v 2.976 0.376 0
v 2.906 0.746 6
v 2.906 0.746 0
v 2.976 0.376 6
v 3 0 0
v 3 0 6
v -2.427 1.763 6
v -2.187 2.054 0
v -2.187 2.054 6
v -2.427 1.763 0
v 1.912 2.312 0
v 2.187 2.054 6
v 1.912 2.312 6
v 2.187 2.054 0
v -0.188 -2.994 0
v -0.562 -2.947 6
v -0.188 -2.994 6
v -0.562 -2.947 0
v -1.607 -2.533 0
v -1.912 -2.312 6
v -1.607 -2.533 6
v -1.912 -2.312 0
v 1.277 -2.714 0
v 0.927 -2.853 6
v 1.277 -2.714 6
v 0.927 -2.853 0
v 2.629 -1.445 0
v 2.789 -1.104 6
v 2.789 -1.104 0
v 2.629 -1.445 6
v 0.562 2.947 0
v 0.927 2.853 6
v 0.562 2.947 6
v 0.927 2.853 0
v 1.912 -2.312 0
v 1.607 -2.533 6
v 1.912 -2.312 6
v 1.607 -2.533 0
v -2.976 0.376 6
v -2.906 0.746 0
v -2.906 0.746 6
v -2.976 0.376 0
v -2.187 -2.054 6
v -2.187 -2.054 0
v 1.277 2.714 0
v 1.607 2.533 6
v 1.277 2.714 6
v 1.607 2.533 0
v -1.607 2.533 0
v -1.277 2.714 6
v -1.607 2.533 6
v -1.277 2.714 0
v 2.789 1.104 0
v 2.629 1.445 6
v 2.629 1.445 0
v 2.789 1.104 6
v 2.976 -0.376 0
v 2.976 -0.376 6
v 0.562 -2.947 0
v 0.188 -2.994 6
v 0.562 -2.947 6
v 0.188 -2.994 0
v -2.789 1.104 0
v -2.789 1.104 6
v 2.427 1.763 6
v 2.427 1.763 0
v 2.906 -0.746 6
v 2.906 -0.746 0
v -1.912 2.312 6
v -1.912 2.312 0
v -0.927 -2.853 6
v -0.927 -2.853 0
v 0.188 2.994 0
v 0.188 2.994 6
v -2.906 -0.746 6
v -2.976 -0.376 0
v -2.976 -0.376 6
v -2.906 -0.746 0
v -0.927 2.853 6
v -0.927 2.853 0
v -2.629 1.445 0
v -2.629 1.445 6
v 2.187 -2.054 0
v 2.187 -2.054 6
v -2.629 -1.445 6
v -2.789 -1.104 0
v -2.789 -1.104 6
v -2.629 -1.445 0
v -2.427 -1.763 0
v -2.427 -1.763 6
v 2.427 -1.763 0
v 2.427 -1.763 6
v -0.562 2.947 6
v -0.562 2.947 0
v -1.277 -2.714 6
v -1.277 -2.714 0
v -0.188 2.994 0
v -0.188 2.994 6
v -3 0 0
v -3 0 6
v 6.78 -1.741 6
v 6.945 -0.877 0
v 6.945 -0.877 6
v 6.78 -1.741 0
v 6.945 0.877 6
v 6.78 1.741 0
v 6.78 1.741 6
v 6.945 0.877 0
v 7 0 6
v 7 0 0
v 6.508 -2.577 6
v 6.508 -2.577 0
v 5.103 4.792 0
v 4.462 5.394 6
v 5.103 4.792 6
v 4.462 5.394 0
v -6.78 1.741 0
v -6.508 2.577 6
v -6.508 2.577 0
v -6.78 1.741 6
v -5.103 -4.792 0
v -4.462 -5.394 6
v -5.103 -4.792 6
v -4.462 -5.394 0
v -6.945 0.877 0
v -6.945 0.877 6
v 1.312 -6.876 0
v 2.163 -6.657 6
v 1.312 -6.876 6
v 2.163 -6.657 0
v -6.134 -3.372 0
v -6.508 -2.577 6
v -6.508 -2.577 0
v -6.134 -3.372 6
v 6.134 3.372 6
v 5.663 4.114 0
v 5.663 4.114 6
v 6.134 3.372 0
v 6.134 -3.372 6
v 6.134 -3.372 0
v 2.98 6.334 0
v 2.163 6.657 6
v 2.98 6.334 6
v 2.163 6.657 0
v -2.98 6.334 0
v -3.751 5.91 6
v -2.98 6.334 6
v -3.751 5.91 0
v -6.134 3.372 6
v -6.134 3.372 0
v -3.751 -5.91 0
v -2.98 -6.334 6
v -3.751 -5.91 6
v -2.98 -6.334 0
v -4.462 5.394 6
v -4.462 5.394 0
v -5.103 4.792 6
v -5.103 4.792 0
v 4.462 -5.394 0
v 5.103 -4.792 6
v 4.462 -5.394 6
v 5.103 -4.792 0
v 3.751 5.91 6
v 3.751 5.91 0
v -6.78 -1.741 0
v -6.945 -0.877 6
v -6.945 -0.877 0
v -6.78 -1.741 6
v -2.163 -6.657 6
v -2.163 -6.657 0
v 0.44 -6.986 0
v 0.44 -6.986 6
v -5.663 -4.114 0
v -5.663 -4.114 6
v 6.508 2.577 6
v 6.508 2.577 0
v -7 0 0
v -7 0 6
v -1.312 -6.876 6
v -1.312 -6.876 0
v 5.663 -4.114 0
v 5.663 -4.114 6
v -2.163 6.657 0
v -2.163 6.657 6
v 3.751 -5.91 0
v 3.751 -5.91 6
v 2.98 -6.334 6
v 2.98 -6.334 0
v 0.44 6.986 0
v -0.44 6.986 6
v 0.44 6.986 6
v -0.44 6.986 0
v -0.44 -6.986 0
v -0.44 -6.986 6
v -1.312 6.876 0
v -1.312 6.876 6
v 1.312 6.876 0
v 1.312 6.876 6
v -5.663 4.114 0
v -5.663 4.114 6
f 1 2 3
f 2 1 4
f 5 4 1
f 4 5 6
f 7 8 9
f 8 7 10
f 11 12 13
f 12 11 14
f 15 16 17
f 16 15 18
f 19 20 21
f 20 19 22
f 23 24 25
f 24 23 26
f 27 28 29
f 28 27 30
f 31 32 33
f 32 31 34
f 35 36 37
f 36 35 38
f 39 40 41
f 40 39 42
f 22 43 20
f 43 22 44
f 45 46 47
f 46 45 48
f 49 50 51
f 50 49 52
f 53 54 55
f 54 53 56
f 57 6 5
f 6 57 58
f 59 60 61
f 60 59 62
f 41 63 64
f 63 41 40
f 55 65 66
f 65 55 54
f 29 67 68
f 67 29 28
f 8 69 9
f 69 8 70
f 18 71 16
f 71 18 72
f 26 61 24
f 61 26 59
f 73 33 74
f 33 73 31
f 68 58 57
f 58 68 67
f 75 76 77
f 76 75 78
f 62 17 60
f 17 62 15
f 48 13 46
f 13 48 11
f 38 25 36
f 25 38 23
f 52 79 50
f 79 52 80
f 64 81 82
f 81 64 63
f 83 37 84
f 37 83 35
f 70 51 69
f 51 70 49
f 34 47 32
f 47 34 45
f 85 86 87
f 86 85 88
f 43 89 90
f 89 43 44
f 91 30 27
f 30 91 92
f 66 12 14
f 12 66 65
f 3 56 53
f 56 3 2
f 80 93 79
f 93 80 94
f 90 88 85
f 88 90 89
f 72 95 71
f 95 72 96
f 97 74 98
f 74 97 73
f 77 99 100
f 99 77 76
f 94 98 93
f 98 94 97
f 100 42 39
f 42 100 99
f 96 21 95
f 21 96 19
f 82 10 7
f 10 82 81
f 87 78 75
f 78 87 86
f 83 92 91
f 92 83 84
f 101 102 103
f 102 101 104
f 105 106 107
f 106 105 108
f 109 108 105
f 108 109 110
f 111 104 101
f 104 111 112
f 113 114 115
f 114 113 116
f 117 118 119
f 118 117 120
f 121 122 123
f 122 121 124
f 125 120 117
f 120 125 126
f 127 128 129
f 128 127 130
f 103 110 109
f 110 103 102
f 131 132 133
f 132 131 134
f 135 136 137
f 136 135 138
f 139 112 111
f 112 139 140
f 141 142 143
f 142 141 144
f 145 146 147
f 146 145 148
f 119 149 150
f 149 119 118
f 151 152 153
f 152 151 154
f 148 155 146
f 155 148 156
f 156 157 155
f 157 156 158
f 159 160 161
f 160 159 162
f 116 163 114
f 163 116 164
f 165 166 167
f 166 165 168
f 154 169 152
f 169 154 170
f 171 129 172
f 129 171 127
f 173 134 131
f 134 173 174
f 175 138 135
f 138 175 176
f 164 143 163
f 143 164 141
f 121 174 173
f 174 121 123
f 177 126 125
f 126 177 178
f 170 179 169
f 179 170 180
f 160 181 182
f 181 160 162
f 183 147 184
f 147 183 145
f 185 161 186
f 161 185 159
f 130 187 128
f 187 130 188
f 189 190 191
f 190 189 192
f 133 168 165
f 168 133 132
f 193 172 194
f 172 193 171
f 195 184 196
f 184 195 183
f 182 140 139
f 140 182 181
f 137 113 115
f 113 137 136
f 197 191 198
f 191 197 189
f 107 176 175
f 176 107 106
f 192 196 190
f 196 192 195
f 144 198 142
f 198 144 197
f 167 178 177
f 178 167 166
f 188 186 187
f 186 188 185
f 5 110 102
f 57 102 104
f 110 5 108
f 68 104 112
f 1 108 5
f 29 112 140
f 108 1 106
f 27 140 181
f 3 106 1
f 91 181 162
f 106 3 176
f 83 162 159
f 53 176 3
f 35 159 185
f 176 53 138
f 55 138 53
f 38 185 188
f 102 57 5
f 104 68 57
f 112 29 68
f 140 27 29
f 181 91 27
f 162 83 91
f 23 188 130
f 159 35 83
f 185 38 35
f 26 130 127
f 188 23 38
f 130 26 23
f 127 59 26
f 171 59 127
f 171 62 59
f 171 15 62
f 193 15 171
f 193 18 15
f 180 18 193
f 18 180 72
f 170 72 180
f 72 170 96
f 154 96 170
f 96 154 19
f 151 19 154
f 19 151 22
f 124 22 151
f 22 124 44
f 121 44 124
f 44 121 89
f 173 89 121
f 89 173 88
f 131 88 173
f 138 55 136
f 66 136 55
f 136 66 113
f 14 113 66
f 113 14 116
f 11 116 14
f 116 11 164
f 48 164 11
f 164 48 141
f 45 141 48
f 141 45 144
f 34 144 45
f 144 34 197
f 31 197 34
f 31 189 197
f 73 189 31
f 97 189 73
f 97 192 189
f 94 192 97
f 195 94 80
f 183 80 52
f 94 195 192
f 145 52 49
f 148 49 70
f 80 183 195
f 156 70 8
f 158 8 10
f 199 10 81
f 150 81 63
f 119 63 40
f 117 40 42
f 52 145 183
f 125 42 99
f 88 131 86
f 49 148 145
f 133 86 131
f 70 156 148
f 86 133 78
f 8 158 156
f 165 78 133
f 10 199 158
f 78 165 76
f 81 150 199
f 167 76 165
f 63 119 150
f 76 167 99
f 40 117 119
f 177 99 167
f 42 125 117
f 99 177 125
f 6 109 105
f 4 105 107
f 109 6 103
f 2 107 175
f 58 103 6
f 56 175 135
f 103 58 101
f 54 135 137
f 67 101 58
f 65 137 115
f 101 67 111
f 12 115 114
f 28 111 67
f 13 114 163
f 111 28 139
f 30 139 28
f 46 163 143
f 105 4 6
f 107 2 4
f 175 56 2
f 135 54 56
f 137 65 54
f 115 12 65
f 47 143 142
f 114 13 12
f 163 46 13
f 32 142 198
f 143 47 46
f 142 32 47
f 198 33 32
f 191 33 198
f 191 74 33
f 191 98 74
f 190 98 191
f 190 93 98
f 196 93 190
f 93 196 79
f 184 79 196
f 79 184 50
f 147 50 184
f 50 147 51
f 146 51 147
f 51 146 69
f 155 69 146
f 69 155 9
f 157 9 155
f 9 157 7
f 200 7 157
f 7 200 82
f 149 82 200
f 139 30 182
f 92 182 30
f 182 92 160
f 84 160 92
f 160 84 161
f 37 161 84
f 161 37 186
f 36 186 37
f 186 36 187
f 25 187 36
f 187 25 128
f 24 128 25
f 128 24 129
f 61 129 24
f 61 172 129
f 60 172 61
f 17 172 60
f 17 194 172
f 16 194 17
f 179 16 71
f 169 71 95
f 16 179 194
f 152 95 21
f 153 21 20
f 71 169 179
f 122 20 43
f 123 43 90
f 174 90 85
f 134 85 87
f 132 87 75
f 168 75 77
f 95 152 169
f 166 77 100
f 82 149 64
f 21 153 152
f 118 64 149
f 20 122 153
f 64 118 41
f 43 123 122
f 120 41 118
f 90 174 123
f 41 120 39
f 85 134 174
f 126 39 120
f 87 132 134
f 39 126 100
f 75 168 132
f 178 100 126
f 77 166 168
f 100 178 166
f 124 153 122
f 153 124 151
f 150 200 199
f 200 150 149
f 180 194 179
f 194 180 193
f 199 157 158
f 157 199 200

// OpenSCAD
$fn = 50;


difference() {
	union() {
		*color(alpha = 1.0000000000, c = "gray") {
			translate(v = [0, 7, 0]) {
				linear_extrude(height = 1) {
					text(font = "Arial:style=Bold", halign = "center", size = 4.5000000000, text = "COMMENT plate main", valign = "center");
				}
			}
		}
		*color(alpha = 1.0000000000, c = "gray") {
			translate(v = [0, 14, 0]) {
				linear_extrude(height = 1) {
					text(font = "Arial:style=Bold", halign = "center", size = 4.5000000000, text = "COMMENT description oobb_plate_shape_p_type_6_depth_1_width_1_height_6_thickness_true_both_holes", valign = "center");
				}
			}
		}
		cylinder(h = 6, r = 7.0000000000);
	}
	union() {
		*color(alpha = 1.0000000000, c = "gray") {
			translate(v = [0, 7, 0]) {
				linear_extrude(height = 1) {
					text(font = "Arial:style=Bold", halign = "center", size = 4.5000000000, text = "COMMENT holes main", valign = "center");
				}
			}
		}
		*color(alpha = 1.0000000000, c = "gray") {
			translate(v = [0, 14, 0]) {
				linear_extrude(height = 1) {
					text(font = "Arial:style=Bold", halign = "center", size = 4.5000000000, text = "COMMENT description oobb_holes_shape_n_type_1_width_1_height_6_thickness_true_both_holes", valign = "center");
				}
			}
		}
		translate(v = [0, 0, -50]) {
			cylinder(h = 100, r = 3.0000000000);
		}
		translate(v = [0, 0, -50]) {
			cylinder(h = 100, r = 1.5000000000);
		}
	}
}
